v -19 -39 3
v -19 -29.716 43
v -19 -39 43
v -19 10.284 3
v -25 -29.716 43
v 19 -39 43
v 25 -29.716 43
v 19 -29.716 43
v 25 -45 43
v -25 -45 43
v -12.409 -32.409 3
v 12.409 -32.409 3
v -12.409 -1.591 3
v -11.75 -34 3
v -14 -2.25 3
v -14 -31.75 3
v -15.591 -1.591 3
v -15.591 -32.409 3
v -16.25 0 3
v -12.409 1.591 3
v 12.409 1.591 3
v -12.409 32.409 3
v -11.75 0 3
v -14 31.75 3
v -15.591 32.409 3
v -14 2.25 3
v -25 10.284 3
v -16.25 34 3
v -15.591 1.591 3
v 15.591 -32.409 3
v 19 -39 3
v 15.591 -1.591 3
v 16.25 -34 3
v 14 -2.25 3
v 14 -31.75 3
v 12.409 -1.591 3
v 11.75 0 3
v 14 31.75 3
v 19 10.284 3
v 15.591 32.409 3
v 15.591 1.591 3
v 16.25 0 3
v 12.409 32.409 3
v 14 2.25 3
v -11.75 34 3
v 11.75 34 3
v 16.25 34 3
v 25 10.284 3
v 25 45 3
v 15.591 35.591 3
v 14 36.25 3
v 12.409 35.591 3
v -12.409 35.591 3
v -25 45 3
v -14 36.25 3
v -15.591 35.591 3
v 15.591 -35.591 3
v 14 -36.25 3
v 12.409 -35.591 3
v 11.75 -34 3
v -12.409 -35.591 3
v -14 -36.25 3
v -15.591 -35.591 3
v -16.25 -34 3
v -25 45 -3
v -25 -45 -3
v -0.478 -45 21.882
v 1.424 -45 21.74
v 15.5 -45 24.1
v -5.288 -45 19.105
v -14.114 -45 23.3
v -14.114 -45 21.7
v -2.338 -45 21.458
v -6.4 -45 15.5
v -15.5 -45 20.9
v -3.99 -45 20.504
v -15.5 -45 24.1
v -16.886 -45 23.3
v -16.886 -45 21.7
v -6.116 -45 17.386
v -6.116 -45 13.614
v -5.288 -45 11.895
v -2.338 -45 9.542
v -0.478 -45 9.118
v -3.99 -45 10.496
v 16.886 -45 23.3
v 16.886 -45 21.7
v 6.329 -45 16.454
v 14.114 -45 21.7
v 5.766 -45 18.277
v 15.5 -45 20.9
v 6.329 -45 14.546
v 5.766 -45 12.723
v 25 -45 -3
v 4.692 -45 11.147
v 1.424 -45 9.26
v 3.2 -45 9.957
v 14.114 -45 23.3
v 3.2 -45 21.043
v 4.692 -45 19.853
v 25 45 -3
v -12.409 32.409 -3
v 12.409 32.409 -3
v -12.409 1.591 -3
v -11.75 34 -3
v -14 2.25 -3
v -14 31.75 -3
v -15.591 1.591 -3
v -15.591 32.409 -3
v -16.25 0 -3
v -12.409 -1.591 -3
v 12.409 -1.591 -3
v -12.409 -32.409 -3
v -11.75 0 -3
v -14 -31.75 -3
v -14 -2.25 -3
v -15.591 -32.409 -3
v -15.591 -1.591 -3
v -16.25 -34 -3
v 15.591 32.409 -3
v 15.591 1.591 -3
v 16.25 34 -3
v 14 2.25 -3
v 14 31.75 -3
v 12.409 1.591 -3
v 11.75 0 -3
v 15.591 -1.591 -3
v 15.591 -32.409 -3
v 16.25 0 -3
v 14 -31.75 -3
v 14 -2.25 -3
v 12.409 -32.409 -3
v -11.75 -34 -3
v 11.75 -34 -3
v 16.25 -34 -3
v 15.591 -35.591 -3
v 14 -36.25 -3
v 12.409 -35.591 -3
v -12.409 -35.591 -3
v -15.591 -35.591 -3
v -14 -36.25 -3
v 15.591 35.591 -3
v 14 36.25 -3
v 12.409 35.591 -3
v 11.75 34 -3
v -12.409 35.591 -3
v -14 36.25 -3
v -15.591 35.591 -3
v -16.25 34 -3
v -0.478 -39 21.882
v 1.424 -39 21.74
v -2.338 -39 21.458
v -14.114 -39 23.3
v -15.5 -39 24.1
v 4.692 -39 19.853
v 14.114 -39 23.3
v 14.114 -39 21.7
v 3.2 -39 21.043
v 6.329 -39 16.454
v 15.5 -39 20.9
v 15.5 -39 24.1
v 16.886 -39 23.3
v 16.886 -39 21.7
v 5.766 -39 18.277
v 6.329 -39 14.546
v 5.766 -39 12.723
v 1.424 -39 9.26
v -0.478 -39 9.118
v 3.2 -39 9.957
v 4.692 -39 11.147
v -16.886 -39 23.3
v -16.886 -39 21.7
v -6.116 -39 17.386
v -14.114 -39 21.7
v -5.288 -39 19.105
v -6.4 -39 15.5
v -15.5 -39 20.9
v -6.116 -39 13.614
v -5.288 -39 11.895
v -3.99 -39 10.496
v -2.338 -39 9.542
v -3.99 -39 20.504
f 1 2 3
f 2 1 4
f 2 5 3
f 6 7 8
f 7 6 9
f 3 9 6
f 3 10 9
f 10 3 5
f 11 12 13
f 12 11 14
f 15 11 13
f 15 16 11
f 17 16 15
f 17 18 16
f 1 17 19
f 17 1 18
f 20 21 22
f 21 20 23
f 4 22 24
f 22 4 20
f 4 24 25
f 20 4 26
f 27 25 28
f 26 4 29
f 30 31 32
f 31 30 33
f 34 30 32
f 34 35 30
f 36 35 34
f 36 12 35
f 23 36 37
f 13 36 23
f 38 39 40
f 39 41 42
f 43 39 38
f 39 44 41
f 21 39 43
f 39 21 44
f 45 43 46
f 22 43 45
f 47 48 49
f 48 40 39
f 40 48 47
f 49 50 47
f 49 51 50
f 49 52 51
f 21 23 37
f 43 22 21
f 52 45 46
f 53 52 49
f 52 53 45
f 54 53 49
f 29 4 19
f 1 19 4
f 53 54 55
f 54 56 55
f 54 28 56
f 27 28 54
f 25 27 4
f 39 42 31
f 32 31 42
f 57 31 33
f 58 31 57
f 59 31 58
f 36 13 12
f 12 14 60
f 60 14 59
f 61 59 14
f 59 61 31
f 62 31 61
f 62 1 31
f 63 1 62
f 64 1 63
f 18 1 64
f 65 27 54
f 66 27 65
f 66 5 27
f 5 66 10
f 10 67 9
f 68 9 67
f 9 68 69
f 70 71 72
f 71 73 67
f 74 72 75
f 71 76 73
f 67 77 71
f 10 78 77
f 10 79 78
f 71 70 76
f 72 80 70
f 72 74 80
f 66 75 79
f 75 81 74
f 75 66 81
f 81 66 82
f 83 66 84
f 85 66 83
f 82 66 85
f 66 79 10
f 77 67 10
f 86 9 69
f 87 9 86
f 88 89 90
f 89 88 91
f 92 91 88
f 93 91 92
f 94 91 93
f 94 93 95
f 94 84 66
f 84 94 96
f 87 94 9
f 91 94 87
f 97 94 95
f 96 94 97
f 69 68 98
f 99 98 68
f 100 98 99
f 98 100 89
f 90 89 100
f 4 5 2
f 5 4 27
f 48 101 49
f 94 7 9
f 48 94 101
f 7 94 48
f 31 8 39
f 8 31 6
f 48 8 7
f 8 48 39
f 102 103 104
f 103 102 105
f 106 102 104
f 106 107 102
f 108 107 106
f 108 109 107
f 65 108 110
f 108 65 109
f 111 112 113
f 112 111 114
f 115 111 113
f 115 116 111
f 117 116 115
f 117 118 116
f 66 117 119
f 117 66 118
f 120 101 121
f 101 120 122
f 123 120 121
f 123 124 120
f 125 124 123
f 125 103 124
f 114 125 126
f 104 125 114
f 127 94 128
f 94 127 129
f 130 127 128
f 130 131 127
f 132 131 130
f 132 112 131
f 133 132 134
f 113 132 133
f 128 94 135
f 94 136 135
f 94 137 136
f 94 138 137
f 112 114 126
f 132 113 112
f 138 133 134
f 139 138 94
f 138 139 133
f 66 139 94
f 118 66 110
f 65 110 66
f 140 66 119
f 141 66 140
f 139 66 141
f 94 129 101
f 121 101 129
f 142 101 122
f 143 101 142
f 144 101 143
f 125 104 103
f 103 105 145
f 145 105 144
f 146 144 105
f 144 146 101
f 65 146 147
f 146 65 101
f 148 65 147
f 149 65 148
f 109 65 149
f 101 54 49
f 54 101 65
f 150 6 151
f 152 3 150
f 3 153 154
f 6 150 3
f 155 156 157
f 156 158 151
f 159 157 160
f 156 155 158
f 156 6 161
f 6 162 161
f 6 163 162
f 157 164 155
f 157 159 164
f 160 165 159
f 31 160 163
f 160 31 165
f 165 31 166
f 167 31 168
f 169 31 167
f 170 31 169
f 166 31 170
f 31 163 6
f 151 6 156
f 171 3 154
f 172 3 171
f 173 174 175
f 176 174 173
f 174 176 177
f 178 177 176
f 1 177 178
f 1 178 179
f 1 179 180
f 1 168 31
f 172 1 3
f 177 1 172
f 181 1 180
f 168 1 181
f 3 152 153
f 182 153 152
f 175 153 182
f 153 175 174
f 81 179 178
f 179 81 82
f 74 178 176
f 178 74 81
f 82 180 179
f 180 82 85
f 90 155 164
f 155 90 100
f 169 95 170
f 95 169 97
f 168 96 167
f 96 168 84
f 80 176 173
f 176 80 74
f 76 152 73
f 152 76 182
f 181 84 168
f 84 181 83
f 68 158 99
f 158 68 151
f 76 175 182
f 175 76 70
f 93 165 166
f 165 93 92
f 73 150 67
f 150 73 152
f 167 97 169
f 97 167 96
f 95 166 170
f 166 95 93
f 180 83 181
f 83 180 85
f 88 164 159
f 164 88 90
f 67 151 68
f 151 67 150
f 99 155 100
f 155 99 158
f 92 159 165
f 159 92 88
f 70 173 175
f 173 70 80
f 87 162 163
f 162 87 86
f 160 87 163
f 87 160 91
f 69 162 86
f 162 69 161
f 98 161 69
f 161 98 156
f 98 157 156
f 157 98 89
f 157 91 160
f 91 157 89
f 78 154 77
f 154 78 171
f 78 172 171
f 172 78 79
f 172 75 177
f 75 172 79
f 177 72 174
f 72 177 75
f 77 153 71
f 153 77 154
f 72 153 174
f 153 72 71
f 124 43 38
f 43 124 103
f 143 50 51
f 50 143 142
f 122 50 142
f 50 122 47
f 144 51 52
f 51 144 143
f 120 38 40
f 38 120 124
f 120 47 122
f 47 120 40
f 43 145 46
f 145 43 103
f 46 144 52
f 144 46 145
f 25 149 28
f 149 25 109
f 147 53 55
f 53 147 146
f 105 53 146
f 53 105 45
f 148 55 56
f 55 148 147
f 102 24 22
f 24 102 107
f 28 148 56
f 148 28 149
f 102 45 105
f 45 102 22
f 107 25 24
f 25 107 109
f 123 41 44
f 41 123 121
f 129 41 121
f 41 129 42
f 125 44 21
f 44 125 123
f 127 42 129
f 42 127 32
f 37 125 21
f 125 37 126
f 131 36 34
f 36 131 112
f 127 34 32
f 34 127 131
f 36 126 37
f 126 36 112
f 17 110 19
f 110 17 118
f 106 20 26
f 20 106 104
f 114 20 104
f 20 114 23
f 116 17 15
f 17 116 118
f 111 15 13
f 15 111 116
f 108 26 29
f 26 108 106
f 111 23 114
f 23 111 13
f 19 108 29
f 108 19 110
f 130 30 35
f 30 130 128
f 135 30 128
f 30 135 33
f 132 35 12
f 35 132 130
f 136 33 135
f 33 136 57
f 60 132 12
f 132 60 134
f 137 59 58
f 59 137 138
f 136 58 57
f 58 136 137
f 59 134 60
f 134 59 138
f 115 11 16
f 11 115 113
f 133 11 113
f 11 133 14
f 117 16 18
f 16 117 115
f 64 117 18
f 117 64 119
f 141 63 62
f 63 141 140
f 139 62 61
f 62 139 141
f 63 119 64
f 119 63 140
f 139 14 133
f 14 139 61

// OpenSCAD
module motor_screw()
{
	translate([0, 31/2, 50])
		cylinder(r = 3.2/2, h = 10, center = true);
}

module motor()
{
	mlen = 94;
	union() {
		cylinder(r = 37/2, h = mlen, center = true);
		translate([0, 7, 3 + mlen/2]) cylinder(r = 6.4, h = 10, center = true);
		rotate(a = [0, 0, 90]) motor_screw();
		rotate(a = [0, 0, 270]) motor_screw();
	}
}

module motor_wall(t, l, h)
{
	intersection() {
		cube([t, l, h], center = true);
		translate([0, -l/3, -h/5])
			rotate(a = [-45, 0, 0])
				cube([t, l, h], center = true);
	}
}

module motor_mount()
{
	thickness = 6;
	length = 90;
	height = 40;
	width = 50;
	difference() {
		union()  {
			cube([width, length, thickness], center = true);
			translate([0, -(length - thickness)/2, (height + thickness)/2])
				cube([width, thickness, height], center = true);
			translate([-(width - thickness)/2, 0, (height + thickness)/2])
				motor_wall(thickness, length, height);
			translate([(width - thickness)/2, 0, (height + thickness)/2])
				motor_wall(thickness, length, height);
		}
		translate([0, 9, 37/2 + thickness/2 + 1])
			rotate(a = [90, 180, 0]) motor();
		translate([width/2 - thickness - 5, length/2 - thickness - 5, 0])
			cylinder(r = 4.5/2, h = thickness + 2, center = true);
		translate([-(width/2 - thickness - 5), length/2 - thickness - 5, 0])
			cylinder(r = 4.5/2, h = thickness + 2, center = true);
		translate([width/2 - thickness - 5, 0, 0])
			cylinder(r = 4.5/2, h = thickness + 2, center = true);
		translate([-(width/2 - thickness - 5), 0, 0])
			cylinder(r = 4.5/2, h = thickness + 2, center = true);
		translate([width/2 - thickness - 5, -(length/2 - thickness - 5), 0])
			cylinder(r = 4.5/2, h = thickness + 2, center = true);
		translate([-(width/2 - thickness - 5), -(length/2 - thickness - 5), 0])
			cylinder(r = 4.5/2, h = thickness + 2, center = true);
	}
}

motor_mount();
